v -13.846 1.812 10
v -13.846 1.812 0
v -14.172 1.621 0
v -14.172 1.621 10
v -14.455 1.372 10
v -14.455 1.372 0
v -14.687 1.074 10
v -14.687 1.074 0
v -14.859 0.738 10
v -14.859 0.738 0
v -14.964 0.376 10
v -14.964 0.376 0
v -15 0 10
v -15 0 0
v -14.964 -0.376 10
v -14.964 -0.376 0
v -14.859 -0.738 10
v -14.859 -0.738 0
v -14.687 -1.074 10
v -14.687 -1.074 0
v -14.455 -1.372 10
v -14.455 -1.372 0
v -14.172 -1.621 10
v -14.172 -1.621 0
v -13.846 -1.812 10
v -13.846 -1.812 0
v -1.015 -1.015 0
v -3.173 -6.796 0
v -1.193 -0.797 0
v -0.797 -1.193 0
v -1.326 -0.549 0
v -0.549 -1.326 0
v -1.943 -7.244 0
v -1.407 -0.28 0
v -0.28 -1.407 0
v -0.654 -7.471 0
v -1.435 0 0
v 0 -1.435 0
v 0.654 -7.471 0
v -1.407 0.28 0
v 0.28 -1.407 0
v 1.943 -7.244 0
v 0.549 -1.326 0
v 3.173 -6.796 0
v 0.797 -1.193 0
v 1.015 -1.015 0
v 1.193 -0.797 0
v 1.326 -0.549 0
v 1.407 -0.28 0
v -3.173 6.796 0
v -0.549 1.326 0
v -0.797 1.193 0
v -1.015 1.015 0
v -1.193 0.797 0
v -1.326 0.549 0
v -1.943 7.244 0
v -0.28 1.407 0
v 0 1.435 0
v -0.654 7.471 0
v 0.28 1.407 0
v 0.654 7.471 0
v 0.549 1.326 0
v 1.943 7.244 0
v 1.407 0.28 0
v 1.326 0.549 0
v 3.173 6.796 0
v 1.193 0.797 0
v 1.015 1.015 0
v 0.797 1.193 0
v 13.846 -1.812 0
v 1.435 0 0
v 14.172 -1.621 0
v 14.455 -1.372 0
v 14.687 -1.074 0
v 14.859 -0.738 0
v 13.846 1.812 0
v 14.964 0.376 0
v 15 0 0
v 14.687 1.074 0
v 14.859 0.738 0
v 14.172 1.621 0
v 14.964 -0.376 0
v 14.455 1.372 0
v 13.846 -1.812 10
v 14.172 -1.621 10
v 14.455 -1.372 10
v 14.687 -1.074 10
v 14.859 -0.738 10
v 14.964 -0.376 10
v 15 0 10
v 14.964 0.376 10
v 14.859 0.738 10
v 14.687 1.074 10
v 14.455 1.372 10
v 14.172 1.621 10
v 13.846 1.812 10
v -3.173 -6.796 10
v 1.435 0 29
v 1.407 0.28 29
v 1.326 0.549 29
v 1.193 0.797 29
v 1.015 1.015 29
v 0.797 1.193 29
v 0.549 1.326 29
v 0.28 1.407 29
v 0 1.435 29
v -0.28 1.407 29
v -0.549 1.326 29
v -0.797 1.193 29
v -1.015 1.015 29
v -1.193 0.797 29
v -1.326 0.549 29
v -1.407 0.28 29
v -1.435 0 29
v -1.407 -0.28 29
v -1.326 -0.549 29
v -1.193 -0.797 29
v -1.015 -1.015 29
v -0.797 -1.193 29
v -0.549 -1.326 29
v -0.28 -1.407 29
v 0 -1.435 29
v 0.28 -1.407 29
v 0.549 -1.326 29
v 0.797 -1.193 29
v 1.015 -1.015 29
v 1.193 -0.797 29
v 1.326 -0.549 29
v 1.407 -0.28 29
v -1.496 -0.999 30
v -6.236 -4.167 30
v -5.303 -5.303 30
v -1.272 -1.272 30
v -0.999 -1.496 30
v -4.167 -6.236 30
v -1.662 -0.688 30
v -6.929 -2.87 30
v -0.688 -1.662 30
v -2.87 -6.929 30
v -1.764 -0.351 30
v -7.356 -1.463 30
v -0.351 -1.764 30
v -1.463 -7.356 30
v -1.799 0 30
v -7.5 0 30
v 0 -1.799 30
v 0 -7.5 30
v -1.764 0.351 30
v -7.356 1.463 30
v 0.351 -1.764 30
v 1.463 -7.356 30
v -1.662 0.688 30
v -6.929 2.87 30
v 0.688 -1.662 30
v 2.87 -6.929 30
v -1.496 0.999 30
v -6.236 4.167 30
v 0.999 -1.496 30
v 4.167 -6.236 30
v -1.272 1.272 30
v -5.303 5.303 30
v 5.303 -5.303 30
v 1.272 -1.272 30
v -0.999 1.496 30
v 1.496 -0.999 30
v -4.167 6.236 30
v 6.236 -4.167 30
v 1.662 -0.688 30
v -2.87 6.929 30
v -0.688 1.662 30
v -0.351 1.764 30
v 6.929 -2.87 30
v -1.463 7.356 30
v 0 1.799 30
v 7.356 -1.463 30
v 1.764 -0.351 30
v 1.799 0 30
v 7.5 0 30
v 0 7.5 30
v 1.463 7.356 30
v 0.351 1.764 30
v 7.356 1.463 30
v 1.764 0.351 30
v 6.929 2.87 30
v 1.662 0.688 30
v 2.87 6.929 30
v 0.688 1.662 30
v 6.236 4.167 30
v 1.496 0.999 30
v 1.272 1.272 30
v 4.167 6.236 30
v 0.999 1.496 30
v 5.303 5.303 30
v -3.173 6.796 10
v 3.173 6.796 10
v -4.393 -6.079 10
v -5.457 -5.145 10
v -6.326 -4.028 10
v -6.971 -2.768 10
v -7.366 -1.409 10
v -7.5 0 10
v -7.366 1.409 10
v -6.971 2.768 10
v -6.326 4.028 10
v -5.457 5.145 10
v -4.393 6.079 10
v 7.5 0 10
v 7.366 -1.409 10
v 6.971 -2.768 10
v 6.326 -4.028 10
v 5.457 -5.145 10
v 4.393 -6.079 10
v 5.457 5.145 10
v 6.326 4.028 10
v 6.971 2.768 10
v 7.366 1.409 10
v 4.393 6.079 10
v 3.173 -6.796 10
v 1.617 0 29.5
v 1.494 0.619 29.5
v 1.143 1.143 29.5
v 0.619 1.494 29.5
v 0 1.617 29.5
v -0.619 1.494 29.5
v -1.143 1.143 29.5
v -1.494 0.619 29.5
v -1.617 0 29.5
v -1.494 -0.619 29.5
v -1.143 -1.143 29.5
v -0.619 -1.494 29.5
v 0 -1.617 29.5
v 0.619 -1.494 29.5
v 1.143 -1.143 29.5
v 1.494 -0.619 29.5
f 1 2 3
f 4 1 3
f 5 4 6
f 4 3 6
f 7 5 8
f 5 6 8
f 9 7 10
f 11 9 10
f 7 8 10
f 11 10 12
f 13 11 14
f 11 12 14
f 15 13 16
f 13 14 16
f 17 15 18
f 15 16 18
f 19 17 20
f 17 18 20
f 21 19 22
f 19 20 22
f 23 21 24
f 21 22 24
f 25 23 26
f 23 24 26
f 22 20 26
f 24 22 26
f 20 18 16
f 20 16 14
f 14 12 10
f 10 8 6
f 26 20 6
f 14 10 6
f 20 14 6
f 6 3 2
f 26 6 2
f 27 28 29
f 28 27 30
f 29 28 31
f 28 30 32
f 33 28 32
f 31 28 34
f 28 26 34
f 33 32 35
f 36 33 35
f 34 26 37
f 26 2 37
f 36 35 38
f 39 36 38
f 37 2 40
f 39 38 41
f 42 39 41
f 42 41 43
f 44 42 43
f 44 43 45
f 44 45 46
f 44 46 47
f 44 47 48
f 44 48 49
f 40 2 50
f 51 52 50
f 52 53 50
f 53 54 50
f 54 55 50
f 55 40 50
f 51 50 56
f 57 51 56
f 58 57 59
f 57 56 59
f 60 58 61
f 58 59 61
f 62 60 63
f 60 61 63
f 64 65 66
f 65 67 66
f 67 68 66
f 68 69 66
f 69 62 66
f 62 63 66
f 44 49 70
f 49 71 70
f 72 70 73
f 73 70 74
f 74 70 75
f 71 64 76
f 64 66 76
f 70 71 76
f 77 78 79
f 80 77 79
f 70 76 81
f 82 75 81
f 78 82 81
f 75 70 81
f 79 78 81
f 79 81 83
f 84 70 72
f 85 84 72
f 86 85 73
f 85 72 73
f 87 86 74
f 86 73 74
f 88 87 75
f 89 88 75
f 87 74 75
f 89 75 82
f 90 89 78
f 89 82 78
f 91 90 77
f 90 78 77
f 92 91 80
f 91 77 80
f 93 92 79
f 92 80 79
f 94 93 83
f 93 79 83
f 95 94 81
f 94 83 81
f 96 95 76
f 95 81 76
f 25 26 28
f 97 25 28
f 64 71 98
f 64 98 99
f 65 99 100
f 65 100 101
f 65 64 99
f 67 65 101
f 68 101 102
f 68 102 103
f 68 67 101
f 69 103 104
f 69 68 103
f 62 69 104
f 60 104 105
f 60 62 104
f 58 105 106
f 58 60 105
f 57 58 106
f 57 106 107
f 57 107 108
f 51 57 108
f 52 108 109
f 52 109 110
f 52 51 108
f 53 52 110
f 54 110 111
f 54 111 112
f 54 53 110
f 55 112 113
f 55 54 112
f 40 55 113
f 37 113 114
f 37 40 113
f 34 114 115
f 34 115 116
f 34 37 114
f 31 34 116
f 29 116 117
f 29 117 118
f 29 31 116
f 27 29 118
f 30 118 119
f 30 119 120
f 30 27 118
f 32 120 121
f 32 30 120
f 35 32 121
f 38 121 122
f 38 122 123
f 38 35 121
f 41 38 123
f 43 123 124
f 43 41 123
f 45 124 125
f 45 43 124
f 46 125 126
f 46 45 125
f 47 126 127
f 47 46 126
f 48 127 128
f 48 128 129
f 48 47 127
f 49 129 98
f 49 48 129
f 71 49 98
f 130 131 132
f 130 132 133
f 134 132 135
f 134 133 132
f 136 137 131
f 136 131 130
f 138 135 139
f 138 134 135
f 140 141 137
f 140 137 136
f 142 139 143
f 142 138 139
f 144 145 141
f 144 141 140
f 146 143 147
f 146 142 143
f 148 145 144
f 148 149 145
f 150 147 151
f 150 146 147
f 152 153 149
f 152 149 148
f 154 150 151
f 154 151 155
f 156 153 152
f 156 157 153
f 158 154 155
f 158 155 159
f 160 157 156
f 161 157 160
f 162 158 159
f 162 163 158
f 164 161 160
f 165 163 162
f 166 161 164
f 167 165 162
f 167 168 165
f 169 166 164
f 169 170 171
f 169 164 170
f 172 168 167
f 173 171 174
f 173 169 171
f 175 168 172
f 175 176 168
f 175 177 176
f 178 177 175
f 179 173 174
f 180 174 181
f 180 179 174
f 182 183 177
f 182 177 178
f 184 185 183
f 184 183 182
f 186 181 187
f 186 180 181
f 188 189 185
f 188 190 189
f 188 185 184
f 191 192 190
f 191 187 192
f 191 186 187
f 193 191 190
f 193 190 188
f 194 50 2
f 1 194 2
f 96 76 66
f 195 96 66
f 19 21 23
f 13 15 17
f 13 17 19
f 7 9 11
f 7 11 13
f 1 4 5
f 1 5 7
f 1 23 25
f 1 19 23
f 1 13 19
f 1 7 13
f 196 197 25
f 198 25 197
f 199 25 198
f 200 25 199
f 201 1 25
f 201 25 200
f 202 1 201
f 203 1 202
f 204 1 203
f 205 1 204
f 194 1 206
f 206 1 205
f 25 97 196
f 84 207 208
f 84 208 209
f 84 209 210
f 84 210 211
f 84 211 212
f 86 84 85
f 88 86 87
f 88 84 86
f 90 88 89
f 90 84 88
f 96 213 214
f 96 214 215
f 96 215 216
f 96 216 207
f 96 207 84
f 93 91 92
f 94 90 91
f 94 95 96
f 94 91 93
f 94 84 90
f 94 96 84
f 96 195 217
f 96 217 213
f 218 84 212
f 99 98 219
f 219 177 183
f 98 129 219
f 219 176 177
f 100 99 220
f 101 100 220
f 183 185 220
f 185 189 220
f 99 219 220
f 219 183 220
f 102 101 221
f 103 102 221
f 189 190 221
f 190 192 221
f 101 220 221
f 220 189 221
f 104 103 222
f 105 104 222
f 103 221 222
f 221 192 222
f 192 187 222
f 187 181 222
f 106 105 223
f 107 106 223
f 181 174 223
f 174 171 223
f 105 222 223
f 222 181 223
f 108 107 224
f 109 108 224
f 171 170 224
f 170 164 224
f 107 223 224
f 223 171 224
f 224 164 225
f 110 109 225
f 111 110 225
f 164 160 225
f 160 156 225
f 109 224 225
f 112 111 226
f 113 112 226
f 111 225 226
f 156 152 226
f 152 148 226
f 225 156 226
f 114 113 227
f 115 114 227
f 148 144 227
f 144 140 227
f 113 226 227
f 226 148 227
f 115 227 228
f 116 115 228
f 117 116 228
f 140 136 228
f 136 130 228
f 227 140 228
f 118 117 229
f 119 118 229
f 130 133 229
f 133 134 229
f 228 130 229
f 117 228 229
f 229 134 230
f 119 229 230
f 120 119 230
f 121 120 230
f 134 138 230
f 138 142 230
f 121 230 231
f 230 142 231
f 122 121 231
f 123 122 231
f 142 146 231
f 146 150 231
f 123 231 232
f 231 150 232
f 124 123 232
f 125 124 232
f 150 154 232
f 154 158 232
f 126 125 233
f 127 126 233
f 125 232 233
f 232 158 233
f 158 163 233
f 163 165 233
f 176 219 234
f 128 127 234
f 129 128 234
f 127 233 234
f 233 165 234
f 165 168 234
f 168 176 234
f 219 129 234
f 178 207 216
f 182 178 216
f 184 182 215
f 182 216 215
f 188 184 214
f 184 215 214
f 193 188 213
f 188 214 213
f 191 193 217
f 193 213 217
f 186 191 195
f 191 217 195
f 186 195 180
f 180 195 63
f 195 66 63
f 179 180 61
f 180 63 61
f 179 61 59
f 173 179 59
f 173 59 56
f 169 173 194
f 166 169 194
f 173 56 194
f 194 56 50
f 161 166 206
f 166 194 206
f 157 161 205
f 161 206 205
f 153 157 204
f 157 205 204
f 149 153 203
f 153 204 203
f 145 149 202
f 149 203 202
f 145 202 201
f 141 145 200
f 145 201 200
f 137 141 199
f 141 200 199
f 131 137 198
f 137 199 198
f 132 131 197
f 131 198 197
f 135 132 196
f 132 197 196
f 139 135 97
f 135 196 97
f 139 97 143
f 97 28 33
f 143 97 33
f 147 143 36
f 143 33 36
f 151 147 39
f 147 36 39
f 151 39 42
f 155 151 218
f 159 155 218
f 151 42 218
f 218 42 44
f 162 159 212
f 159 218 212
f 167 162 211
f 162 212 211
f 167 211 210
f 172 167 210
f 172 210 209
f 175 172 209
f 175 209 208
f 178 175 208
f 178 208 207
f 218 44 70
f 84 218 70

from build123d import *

# Parameters (mm, degrees)
F0_R     = 7.5
F0_R_2   = 1.435
F1_DEPTH = 30
F2_SIZE2 = 0.36397
F2_SIZE  = 1
F4_DEPTH = 10


with BuildPart() as f1:
    # F0 (on Top) → F1 (new body)
    with BuildSketch(Plane.XY):
        Circle(F0_R)
        Circle(F0_R_2, mode=Mode.SUBTRACT)
    extrude(amount=F1_DEPTH)

    # F2
    f2_edges = [f1.edges().sort_by_distance(p)[0] for p in [
        (-1.435, 0, 30),
    ]]
    chamfer(f2_edges, length=F2_SIZE, length2=F2_SIZE2)

    # F3 (on Top) → F4 (join)
    with BuildSketch(Plane.XY):
        with BuildLine():
            ThreePointArc((-3.173077, -6.795703), (-7.5, 0), (-3.173077, 6.795703))
            Line((-3.173077, 6.795703), (-13.846154, 1.812188))
            ThreePointArc((-13.846154, 1.812188), (-15, 0), (-13.846154, -1.812188))
            Line((-13.846154, -1.812188), (-3.173077, -6.795703))
        make_face()
        with BuildLine():
            ThreePointArc((13.846154, -1.812188), (15, 0), (13.846154, 1.812188))
            Line((13.846154, 1.812188), (3.173077, 6.795703))
            ThreePointArc((3.173077, 6.795703), (7.5, 0), (3.173077, -6.795703))
            Line((3.173077, -6.795703), (13.846154, -1.812188))
        make_face()
    extrude(amount=F4_DEPTH)


solid = f1.part
